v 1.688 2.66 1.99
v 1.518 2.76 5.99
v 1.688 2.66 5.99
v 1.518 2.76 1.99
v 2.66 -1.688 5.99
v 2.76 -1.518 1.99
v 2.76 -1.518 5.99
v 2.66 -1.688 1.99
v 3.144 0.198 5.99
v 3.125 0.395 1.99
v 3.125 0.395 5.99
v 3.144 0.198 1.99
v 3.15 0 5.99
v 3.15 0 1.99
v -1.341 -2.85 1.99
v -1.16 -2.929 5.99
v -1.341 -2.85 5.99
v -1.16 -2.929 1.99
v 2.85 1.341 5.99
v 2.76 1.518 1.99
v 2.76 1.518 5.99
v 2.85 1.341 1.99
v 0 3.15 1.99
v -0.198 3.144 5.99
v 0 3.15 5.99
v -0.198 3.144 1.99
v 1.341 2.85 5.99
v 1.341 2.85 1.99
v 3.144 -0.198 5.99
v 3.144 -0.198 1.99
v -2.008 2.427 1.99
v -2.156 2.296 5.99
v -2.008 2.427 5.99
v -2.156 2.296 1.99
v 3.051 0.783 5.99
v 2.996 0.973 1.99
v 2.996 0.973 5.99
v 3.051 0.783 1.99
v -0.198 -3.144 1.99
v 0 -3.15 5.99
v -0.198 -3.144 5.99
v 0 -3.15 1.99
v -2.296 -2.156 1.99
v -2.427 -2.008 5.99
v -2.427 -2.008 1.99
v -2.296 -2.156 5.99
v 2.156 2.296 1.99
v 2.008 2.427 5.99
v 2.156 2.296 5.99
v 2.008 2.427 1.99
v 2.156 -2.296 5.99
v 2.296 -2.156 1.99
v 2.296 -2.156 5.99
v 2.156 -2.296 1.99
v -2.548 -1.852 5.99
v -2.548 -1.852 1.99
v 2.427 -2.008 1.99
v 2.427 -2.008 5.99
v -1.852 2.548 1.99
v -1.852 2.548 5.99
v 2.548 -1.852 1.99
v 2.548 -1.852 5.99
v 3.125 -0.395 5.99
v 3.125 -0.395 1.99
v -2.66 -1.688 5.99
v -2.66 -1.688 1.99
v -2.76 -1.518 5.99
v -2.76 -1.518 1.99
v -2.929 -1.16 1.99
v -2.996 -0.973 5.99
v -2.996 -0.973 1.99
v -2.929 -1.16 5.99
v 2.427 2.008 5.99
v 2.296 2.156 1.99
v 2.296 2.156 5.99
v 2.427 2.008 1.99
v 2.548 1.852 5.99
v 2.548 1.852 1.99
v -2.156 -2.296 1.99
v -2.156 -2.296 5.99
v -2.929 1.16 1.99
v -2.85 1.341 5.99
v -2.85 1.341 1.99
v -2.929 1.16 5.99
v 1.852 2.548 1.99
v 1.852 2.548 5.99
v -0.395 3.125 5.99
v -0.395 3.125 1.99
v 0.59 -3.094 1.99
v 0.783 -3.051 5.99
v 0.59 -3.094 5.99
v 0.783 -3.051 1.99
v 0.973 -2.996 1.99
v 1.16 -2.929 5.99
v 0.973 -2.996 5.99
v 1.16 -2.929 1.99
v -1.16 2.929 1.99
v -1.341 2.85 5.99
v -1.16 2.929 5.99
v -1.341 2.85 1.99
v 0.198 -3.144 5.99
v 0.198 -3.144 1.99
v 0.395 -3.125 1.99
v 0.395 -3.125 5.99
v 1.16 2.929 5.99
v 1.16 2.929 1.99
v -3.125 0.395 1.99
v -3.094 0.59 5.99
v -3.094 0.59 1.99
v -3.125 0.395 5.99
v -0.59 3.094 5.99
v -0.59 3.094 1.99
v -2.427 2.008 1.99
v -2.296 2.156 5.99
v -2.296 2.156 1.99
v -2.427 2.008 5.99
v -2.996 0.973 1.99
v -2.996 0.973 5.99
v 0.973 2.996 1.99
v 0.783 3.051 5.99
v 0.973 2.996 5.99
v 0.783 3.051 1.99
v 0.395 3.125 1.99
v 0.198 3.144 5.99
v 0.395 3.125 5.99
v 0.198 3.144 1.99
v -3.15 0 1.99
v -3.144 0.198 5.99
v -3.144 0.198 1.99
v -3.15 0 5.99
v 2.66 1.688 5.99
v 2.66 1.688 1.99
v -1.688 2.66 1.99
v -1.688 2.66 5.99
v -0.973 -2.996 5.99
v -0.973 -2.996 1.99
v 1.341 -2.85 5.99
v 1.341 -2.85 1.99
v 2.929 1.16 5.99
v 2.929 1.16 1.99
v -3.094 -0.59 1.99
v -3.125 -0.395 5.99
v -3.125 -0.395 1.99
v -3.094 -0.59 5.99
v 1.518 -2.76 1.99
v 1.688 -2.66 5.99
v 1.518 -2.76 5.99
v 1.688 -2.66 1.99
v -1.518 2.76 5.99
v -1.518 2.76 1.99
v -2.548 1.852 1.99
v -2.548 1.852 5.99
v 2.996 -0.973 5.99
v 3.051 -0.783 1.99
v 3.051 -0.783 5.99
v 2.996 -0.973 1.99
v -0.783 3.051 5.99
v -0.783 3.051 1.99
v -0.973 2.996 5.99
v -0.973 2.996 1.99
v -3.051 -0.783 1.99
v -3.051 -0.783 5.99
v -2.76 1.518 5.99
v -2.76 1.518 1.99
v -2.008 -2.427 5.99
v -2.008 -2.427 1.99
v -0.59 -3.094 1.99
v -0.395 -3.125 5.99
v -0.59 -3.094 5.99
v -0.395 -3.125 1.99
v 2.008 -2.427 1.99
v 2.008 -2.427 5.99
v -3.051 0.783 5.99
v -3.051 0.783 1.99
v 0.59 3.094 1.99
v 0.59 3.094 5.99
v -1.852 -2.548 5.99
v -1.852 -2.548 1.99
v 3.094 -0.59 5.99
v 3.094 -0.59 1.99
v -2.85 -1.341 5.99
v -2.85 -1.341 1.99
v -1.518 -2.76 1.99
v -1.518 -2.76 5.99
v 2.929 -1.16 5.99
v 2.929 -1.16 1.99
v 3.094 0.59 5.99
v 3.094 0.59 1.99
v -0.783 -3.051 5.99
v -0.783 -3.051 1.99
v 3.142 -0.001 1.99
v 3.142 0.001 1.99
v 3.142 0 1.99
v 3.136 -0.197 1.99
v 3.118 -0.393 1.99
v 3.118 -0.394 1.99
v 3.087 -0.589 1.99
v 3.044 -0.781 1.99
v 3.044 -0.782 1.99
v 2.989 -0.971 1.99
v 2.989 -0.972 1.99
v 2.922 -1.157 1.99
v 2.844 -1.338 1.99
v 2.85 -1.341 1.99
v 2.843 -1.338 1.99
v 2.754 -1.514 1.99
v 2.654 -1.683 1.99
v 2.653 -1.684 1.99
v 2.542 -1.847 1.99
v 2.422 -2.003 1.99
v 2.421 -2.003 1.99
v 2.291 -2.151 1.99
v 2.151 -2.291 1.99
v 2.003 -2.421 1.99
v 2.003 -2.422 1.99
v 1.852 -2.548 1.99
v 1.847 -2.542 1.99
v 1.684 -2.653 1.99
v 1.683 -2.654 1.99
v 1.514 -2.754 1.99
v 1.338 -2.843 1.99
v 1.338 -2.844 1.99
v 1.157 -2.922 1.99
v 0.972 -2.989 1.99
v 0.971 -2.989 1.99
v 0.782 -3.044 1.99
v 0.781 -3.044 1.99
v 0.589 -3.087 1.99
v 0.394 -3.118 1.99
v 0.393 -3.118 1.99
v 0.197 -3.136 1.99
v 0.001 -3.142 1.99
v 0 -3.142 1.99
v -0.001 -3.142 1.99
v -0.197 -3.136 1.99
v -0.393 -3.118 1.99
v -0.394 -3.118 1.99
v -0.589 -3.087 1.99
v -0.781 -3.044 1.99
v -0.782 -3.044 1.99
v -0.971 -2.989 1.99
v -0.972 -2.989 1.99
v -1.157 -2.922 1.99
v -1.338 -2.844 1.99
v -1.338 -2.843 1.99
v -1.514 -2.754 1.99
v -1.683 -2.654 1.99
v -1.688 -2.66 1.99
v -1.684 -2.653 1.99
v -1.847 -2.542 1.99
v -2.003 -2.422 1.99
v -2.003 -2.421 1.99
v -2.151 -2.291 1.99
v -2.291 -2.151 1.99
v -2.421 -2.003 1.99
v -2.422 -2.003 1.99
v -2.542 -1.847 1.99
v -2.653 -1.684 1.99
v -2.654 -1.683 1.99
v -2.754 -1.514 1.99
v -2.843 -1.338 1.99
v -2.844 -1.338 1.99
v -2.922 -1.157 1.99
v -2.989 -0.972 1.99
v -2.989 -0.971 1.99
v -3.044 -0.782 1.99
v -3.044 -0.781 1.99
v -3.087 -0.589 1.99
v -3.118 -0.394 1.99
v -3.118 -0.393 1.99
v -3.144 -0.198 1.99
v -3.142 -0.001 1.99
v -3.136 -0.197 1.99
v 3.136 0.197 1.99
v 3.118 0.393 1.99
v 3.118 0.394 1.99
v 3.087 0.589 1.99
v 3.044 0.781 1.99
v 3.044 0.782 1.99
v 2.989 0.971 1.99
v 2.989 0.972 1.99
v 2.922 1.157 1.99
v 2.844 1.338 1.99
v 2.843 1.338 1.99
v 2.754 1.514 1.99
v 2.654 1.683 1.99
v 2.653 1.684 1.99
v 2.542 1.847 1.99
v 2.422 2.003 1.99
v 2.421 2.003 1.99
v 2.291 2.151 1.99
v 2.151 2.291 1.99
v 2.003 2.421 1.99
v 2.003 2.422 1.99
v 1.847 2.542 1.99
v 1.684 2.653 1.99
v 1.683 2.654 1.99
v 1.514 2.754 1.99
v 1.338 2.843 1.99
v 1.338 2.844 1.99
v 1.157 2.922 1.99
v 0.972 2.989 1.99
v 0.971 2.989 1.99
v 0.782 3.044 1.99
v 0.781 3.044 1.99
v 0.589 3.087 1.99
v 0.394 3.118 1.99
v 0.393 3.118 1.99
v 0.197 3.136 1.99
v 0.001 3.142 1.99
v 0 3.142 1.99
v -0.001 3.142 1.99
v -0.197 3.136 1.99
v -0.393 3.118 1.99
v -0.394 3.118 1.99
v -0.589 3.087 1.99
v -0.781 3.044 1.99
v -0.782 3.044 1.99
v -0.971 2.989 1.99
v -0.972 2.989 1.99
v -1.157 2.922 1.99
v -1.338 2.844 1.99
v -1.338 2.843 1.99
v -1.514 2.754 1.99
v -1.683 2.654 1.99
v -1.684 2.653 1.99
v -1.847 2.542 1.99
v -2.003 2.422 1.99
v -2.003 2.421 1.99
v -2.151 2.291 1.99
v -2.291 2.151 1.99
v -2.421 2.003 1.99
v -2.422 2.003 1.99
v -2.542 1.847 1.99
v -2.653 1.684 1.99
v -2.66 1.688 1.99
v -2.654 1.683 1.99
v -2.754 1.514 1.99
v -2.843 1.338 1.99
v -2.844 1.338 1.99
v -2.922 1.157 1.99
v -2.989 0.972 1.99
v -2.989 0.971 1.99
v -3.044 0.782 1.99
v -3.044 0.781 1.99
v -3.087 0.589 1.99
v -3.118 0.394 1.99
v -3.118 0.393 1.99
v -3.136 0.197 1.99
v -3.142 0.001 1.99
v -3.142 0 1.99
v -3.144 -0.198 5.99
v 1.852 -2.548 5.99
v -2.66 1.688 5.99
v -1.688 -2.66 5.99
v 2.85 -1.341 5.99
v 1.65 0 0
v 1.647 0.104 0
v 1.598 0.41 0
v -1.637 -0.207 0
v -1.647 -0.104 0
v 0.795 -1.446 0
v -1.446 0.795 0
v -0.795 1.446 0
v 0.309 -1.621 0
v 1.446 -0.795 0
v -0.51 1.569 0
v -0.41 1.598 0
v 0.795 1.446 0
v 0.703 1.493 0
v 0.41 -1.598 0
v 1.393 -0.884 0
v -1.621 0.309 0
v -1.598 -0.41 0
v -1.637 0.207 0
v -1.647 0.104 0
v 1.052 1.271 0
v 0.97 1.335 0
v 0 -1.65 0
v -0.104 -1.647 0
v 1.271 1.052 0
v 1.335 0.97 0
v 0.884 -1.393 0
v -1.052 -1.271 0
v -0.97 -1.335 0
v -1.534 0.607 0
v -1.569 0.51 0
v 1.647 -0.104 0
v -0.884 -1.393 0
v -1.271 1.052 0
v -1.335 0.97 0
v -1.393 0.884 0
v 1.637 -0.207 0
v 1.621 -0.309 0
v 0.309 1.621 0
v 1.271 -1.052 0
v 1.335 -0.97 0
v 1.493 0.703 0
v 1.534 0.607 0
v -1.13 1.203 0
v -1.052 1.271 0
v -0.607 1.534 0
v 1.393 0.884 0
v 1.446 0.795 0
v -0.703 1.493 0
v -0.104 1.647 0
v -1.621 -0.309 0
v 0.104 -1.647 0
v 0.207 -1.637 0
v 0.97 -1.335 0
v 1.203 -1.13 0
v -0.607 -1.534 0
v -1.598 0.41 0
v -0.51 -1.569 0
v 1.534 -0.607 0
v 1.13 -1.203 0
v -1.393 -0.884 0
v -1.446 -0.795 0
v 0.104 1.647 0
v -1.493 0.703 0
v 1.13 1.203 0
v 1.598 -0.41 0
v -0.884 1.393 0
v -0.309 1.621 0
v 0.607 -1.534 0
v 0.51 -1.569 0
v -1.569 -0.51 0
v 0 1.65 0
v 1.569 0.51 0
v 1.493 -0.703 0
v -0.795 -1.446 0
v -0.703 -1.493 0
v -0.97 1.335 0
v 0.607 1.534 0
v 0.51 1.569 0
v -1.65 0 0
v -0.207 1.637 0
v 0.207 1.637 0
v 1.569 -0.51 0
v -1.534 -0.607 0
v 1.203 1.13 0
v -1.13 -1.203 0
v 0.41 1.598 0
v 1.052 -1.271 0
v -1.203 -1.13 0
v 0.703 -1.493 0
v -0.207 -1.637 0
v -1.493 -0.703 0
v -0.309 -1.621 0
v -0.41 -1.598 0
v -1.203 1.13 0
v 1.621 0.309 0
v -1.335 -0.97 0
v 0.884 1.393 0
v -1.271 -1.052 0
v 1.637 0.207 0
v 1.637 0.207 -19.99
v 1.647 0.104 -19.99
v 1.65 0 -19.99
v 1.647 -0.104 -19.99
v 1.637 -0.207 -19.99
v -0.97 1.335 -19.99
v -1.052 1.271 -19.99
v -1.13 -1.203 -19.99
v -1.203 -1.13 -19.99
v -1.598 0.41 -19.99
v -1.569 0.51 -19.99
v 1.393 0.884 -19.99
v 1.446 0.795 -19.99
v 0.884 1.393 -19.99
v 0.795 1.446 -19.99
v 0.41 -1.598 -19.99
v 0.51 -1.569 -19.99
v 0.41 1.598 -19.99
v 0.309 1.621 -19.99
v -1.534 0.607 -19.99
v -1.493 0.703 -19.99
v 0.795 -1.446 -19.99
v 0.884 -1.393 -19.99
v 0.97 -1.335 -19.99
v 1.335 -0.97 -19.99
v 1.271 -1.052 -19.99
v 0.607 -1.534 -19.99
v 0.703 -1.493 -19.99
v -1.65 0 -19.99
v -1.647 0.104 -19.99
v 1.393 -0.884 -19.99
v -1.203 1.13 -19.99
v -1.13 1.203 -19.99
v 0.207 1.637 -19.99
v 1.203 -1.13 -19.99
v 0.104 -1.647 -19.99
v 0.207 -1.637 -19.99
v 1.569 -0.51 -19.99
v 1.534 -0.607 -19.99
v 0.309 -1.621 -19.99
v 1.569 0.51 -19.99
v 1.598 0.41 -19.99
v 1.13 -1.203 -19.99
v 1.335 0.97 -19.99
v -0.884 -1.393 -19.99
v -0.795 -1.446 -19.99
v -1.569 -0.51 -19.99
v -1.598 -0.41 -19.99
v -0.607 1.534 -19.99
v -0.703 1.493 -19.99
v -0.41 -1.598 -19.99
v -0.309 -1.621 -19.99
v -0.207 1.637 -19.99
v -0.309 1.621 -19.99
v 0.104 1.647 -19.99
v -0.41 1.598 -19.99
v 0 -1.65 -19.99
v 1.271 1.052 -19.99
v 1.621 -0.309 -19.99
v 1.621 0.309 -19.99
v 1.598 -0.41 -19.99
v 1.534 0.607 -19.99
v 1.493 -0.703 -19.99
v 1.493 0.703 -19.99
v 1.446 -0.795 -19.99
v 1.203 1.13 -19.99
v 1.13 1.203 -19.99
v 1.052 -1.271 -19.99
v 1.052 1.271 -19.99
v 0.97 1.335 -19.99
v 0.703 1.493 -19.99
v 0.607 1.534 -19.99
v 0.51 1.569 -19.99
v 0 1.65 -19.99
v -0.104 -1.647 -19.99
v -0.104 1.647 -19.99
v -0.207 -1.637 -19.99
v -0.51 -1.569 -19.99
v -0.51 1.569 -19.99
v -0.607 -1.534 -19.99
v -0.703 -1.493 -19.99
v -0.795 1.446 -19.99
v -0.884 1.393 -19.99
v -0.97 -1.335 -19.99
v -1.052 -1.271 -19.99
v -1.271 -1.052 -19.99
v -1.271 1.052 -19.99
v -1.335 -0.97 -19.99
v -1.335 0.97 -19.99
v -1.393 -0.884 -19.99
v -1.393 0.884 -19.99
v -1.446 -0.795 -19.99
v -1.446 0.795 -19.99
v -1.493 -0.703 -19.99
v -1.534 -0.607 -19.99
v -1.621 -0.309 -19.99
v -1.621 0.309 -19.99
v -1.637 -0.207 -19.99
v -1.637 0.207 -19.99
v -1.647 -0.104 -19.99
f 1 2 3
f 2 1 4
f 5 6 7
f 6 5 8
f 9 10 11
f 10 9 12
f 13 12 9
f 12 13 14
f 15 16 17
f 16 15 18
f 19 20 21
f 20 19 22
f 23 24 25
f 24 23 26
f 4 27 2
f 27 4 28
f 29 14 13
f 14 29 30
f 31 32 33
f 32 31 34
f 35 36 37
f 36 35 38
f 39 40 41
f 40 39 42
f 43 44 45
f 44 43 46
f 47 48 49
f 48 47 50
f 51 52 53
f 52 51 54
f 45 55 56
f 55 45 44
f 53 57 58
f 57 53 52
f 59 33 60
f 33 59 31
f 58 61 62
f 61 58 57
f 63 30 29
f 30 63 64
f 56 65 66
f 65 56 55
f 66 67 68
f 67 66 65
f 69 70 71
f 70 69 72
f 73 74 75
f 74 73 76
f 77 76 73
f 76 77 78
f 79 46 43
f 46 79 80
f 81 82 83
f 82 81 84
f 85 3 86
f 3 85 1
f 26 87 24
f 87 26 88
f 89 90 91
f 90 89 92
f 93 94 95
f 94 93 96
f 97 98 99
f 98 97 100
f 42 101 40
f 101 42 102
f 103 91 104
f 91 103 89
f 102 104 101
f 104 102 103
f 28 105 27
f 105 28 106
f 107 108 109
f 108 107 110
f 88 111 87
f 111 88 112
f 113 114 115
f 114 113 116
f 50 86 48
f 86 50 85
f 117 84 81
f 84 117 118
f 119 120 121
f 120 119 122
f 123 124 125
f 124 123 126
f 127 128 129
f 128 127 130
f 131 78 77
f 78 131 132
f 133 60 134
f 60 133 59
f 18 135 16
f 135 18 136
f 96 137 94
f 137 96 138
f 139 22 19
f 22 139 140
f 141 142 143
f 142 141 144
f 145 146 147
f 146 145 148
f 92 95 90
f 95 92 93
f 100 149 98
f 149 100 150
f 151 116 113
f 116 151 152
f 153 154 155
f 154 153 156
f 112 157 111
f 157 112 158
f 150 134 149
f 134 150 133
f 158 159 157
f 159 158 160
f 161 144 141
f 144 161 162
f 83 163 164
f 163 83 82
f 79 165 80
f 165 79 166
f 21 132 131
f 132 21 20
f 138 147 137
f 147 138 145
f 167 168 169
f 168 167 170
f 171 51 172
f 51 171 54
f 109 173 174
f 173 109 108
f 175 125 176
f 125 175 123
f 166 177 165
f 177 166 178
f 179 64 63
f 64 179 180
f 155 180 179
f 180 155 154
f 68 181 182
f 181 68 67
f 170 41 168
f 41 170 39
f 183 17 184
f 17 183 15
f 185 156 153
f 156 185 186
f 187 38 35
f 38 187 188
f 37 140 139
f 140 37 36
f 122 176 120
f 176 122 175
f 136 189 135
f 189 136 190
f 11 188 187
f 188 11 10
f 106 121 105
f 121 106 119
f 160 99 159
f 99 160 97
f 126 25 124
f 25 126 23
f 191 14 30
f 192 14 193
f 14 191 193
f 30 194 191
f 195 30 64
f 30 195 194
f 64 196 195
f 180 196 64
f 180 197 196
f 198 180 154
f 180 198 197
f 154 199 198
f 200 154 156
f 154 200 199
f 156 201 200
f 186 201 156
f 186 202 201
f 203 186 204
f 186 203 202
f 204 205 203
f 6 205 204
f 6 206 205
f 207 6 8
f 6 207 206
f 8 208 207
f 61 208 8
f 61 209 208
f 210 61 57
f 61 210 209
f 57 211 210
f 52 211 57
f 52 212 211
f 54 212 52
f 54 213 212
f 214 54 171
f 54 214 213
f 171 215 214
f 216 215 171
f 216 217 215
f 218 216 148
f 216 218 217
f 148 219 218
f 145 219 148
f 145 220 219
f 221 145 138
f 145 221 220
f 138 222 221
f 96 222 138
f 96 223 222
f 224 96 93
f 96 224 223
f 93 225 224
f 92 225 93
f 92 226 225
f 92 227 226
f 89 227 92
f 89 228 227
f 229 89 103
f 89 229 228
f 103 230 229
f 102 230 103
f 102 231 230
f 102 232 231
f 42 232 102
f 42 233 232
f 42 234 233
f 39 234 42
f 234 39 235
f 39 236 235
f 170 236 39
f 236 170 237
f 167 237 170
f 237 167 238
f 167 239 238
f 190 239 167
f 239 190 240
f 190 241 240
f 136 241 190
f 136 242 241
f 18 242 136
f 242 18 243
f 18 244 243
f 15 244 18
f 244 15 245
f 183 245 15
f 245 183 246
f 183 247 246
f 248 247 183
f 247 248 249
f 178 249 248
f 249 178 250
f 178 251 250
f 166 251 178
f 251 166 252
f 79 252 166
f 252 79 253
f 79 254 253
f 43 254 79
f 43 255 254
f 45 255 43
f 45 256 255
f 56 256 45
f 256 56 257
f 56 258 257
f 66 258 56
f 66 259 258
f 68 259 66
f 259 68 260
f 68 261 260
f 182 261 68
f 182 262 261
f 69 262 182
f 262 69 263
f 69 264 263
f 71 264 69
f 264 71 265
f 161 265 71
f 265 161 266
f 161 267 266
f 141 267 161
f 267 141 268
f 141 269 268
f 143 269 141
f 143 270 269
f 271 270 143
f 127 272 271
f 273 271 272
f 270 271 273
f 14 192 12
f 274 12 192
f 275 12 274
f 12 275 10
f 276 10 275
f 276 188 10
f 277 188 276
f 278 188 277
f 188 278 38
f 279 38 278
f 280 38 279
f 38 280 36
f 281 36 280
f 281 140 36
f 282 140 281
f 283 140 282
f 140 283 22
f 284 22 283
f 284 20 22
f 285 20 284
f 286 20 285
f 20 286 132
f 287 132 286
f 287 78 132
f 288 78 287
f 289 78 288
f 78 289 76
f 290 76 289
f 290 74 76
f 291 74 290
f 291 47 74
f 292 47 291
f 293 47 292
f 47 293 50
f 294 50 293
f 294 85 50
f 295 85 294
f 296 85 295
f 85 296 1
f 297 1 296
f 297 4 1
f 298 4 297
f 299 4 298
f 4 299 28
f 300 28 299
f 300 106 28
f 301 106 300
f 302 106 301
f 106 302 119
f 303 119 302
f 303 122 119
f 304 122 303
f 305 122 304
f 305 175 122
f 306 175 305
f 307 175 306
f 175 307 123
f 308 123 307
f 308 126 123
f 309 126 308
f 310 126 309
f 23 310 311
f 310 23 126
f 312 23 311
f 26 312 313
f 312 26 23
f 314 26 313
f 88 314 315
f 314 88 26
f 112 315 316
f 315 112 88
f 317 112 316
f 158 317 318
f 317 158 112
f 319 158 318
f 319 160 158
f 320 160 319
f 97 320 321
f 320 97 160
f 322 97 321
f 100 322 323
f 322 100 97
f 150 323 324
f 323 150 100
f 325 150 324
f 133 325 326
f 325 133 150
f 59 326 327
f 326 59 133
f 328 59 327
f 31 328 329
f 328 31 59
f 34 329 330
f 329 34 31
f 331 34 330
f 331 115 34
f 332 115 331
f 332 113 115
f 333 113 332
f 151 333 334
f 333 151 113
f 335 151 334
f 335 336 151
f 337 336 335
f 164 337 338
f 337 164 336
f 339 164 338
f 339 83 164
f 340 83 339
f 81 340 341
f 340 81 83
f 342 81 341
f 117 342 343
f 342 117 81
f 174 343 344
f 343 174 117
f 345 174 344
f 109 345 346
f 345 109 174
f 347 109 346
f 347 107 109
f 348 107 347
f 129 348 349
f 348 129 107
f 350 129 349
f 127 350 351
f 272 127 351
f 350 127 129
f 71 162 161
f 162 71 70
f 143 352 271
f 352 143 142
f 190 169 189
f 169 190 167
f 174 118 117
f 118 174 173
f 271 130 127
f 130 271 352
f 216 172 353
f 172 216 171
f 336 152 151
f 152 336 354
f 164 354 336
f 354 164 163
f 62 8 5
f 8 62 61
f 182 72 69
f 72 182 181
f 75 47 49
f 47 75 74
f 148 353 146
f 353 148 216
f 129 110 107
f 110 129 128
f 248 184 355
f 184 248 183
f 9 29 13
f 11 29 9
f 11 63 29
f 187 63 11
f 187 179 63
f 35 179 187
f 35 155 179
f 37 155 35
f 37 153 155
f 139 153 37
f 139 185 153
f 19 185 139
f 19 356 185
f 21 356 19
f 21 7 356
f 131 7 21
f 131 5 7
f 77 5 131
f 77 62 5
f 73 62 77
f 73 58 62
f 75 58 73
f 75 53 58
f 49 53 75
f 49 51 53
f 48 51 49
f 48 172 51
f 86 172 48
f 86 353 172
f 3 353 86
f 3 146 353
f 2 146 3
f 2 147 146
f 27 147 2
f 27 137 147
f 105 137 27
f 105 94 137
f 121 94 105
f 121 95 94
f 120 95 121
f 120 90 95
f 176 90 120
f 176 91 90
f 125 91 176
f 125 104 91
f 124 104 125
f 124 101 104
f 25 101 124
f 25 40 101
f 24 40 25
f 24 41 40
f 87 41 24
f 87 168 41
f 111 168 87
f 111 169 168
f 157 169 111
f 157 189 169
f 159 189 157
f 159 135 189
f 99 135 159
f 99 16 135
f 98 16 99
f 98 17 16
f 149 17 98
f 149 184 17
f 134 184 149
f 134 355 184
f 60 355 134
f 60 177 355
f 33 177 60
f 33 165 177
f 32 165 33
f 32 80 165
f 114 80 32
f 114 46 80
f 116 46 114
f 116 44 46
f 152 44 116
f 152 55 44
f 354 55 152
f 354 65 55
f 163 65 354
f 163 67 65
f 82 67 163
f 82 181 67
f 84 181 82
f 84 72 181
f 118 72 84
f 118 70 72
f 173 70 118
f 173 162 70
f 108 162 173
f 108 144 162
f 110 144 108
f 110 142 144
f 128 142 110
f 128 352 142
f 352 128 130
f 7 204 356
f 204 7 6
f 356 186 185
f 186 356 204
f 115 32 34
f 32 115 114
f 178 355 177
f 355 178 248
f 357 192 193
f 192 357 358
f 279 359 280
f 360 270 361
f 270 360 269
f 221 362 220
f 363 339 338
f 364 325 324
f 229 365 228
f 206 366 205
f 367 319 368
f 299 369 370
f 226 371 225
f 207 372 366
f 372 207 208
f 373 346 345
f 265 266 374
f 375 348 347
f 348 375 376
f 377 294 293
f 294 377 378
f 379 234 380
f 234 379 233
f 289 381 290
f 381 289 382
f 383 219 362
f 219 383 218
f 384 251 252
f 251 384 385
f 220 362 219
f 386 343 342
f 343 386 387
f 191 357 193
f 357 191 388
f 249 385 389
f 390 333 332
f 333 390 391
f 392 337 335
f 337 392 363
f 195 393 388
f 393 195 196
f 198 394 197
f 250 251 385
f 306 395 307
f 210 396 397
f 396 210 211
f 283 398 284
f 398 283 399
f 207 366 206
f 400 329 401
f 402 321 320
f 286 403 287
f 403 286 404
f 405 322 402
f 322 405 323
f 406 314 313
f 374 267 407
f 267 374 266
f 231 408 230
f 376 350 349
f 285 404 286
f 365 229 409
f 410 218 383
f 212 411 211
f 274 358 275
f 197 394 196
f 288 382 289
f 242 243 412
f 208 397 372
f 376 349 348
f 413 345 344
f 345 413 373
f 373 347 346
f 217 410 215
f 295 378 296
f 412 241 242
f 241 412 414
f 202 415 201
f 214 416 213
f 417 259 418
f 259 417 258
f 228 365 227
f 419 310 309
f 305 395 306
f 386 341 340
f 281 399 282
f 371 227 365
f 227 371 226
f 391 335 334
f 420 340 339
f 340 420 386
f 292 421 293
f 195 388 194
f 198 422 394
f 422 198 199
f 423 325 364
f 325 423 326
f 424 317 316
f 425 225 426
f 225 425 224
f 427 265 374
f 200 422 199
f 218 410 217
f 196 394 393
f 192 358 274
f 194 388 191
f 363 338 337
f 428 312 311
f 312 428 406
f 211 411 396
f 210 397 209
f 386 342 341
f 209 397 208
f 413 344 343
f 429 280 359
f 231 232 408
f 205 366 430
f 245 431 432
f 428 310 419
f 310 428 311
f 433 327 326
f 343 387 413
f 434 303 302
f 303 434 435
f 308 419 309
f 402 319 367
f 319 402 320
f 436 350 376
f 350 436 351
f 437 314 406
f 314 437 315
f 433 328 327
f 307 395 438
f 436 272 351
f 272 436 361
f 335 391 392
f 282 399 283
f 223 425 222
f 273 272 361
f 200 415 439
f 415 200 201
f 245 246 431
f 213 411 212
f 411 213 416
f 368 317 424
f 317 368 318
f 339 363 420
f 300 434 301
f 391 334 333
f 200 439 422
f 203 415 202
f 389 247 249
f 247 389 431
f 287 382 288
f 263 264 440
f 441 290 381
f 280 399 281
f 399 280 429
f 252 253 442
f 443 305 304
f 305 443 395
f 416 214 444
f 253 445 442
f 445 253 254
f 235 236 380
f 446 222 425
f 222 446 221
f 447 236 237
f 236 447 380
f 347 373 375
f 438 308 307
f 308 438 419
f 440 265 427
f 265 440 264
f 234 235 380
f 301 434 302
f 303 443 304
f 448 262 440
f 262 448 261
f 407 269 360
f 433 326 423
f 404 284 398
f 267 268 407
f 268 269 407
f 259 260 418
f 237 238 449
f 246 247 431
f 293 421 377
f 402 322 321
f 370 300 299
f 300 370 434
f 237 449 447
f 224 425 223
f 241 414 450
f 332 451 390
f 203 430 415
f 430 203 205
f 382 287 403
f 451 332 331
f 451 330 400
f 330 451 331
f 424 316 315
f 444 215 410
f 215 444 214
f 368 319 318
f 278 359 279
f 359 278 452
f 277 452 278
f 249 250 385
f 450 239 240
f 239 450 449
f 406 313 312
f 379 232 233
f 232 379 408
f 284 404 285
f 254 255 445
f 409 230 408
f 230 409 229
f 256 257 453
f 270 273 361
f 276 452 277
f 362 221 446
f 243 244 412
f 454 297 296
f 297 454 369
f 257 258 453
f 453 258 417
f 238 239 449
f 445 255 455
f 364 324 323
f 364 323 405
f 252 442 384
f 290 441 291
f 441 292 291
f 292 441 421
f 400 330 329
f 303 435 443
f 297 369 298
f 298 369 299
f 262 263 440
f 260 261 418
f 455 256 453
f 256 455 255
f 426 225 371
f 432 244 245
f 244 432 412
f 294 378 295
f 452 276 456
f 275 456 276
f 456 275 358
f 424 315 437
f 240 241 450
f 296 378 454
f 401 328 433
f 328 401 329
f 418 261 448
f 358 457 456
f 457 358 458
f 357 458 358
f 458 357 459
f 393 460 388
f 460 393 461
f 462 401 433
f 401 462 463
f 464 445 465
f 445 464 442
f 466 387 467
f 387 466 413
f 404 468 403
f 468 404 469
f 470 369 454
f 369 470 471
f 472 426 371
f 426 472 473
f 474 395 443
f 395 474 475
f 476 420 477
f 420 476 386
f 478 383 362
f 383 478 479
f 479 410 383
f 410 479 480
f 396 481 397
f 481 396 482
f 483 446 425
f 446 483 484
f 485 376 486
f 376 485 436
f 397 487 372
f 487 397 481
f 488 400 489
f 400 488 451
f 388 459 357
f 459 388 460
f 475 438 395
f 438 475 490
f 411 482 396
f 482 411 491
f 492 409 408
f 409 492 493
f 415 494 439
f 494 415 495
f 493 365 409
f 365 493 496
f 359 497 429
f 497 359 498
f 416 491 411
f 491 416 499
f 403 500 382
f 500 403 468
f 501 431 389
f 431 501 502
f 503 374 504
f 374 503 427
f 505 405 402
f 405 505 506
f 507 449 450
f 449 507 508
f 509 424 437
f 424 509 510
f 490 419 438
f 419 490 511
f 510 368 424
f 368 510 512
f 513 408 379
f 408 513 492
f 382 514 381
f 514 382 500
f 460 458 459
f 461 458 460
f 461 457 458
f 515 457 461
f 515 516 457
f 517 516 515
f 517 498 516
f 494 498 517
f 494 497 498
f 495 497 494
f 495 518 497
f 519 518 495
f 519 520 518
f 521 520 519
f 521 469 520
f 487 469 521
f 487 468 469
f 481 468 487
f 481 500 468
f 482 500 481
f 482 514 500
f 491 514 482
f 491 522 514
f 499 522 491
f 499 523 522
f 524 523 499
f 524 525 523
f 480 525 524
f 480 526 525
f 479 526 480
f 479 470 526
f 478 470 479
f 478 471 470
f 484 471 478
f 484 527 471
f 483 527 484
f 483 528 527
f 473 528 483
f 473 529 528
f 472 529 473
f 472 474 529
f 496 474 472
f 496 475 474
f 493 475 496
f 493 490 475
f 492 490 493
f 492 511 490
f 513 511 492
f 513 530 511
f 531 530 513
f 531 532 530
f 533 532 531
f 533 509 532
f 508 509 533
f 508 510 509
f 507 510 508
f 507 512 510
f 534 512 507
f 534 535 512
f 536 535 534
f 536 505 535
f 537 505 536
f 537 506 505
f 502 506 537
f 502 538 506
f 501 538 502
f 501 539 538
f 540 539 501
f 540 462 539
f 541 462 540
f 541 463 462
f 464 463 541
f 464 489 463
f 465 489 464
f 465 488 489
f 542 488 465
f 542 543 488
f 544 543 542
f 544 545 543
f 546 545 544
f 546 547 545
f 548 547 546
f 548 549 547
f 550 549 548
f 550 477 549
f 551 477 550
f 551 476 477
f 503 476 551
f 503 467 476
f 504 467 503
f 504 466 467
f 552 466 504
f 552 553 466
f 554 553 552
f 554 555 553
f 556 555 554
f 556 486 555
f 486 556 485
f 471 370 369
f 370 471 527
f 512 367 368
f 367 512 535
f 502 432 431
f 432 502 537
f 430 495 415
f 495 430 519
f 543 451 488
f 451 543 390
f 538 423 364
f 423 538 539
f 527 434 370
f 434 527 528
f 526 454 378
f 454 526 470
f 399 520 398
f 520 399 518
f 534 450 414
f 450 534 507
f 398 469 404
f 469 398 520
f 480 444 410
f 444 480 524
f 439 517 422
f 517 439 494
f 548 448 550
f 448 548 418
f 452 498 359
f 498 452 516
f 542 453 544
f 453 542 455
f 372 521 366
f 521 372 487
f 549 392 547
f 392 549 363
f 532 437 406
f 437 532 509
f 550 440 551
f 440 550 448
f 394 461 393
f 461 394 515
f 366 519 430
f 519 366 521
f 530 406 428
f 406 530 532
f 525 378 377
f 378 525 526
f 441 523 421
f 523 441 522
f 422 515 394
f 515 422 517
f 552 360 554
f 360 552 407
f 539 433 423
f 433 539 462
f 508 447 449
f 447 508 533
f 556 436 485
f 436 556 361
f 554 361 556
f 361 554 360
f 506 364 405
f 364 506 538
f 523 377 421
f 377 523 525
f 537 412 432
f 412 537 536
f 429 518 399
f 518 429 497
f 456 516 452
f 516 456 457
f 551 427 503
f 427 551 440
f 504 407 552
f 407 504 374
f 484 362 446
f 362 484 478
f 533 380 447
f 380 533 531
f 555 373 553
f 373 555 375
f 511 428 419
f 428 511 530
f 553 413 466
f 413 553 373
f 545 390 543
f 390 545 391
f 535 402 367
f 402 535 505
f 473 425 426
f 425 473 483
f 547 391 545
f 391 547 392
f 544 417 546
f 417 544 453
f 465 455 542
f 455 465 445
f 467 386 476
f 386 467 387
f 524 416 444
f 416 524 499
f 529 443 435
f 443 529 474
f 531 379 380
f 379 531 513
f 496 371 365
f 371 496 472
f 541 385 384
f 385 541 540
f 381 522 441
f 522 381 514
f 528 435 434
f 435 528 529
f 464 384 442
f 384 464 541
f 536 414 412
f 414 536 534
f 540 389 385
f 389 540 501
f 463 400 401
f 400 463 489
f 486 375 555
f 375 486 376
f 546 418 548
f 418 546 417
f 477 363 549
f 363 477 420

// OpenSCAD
module bolt($fn = $fn) {
    
    epsilone = 0.01;

    color("DimGray")
    translate([0,0,-20])
        union() {
            translate([0,0,22 - 0.01])
                cylinder(h = 4, d = 6.3, center = false, $fn = $fn);

            translate([0,0,20])
                cylinder(h = 2, d1 = 3.3, d2 = 6.3, center = false, $fn = $fn);
            
            translate([0,0,0.01])
                cylinder(h = 20, d = 3.3, center = false, $fn = $fn);
        }

}

bolt($fn = 100);
